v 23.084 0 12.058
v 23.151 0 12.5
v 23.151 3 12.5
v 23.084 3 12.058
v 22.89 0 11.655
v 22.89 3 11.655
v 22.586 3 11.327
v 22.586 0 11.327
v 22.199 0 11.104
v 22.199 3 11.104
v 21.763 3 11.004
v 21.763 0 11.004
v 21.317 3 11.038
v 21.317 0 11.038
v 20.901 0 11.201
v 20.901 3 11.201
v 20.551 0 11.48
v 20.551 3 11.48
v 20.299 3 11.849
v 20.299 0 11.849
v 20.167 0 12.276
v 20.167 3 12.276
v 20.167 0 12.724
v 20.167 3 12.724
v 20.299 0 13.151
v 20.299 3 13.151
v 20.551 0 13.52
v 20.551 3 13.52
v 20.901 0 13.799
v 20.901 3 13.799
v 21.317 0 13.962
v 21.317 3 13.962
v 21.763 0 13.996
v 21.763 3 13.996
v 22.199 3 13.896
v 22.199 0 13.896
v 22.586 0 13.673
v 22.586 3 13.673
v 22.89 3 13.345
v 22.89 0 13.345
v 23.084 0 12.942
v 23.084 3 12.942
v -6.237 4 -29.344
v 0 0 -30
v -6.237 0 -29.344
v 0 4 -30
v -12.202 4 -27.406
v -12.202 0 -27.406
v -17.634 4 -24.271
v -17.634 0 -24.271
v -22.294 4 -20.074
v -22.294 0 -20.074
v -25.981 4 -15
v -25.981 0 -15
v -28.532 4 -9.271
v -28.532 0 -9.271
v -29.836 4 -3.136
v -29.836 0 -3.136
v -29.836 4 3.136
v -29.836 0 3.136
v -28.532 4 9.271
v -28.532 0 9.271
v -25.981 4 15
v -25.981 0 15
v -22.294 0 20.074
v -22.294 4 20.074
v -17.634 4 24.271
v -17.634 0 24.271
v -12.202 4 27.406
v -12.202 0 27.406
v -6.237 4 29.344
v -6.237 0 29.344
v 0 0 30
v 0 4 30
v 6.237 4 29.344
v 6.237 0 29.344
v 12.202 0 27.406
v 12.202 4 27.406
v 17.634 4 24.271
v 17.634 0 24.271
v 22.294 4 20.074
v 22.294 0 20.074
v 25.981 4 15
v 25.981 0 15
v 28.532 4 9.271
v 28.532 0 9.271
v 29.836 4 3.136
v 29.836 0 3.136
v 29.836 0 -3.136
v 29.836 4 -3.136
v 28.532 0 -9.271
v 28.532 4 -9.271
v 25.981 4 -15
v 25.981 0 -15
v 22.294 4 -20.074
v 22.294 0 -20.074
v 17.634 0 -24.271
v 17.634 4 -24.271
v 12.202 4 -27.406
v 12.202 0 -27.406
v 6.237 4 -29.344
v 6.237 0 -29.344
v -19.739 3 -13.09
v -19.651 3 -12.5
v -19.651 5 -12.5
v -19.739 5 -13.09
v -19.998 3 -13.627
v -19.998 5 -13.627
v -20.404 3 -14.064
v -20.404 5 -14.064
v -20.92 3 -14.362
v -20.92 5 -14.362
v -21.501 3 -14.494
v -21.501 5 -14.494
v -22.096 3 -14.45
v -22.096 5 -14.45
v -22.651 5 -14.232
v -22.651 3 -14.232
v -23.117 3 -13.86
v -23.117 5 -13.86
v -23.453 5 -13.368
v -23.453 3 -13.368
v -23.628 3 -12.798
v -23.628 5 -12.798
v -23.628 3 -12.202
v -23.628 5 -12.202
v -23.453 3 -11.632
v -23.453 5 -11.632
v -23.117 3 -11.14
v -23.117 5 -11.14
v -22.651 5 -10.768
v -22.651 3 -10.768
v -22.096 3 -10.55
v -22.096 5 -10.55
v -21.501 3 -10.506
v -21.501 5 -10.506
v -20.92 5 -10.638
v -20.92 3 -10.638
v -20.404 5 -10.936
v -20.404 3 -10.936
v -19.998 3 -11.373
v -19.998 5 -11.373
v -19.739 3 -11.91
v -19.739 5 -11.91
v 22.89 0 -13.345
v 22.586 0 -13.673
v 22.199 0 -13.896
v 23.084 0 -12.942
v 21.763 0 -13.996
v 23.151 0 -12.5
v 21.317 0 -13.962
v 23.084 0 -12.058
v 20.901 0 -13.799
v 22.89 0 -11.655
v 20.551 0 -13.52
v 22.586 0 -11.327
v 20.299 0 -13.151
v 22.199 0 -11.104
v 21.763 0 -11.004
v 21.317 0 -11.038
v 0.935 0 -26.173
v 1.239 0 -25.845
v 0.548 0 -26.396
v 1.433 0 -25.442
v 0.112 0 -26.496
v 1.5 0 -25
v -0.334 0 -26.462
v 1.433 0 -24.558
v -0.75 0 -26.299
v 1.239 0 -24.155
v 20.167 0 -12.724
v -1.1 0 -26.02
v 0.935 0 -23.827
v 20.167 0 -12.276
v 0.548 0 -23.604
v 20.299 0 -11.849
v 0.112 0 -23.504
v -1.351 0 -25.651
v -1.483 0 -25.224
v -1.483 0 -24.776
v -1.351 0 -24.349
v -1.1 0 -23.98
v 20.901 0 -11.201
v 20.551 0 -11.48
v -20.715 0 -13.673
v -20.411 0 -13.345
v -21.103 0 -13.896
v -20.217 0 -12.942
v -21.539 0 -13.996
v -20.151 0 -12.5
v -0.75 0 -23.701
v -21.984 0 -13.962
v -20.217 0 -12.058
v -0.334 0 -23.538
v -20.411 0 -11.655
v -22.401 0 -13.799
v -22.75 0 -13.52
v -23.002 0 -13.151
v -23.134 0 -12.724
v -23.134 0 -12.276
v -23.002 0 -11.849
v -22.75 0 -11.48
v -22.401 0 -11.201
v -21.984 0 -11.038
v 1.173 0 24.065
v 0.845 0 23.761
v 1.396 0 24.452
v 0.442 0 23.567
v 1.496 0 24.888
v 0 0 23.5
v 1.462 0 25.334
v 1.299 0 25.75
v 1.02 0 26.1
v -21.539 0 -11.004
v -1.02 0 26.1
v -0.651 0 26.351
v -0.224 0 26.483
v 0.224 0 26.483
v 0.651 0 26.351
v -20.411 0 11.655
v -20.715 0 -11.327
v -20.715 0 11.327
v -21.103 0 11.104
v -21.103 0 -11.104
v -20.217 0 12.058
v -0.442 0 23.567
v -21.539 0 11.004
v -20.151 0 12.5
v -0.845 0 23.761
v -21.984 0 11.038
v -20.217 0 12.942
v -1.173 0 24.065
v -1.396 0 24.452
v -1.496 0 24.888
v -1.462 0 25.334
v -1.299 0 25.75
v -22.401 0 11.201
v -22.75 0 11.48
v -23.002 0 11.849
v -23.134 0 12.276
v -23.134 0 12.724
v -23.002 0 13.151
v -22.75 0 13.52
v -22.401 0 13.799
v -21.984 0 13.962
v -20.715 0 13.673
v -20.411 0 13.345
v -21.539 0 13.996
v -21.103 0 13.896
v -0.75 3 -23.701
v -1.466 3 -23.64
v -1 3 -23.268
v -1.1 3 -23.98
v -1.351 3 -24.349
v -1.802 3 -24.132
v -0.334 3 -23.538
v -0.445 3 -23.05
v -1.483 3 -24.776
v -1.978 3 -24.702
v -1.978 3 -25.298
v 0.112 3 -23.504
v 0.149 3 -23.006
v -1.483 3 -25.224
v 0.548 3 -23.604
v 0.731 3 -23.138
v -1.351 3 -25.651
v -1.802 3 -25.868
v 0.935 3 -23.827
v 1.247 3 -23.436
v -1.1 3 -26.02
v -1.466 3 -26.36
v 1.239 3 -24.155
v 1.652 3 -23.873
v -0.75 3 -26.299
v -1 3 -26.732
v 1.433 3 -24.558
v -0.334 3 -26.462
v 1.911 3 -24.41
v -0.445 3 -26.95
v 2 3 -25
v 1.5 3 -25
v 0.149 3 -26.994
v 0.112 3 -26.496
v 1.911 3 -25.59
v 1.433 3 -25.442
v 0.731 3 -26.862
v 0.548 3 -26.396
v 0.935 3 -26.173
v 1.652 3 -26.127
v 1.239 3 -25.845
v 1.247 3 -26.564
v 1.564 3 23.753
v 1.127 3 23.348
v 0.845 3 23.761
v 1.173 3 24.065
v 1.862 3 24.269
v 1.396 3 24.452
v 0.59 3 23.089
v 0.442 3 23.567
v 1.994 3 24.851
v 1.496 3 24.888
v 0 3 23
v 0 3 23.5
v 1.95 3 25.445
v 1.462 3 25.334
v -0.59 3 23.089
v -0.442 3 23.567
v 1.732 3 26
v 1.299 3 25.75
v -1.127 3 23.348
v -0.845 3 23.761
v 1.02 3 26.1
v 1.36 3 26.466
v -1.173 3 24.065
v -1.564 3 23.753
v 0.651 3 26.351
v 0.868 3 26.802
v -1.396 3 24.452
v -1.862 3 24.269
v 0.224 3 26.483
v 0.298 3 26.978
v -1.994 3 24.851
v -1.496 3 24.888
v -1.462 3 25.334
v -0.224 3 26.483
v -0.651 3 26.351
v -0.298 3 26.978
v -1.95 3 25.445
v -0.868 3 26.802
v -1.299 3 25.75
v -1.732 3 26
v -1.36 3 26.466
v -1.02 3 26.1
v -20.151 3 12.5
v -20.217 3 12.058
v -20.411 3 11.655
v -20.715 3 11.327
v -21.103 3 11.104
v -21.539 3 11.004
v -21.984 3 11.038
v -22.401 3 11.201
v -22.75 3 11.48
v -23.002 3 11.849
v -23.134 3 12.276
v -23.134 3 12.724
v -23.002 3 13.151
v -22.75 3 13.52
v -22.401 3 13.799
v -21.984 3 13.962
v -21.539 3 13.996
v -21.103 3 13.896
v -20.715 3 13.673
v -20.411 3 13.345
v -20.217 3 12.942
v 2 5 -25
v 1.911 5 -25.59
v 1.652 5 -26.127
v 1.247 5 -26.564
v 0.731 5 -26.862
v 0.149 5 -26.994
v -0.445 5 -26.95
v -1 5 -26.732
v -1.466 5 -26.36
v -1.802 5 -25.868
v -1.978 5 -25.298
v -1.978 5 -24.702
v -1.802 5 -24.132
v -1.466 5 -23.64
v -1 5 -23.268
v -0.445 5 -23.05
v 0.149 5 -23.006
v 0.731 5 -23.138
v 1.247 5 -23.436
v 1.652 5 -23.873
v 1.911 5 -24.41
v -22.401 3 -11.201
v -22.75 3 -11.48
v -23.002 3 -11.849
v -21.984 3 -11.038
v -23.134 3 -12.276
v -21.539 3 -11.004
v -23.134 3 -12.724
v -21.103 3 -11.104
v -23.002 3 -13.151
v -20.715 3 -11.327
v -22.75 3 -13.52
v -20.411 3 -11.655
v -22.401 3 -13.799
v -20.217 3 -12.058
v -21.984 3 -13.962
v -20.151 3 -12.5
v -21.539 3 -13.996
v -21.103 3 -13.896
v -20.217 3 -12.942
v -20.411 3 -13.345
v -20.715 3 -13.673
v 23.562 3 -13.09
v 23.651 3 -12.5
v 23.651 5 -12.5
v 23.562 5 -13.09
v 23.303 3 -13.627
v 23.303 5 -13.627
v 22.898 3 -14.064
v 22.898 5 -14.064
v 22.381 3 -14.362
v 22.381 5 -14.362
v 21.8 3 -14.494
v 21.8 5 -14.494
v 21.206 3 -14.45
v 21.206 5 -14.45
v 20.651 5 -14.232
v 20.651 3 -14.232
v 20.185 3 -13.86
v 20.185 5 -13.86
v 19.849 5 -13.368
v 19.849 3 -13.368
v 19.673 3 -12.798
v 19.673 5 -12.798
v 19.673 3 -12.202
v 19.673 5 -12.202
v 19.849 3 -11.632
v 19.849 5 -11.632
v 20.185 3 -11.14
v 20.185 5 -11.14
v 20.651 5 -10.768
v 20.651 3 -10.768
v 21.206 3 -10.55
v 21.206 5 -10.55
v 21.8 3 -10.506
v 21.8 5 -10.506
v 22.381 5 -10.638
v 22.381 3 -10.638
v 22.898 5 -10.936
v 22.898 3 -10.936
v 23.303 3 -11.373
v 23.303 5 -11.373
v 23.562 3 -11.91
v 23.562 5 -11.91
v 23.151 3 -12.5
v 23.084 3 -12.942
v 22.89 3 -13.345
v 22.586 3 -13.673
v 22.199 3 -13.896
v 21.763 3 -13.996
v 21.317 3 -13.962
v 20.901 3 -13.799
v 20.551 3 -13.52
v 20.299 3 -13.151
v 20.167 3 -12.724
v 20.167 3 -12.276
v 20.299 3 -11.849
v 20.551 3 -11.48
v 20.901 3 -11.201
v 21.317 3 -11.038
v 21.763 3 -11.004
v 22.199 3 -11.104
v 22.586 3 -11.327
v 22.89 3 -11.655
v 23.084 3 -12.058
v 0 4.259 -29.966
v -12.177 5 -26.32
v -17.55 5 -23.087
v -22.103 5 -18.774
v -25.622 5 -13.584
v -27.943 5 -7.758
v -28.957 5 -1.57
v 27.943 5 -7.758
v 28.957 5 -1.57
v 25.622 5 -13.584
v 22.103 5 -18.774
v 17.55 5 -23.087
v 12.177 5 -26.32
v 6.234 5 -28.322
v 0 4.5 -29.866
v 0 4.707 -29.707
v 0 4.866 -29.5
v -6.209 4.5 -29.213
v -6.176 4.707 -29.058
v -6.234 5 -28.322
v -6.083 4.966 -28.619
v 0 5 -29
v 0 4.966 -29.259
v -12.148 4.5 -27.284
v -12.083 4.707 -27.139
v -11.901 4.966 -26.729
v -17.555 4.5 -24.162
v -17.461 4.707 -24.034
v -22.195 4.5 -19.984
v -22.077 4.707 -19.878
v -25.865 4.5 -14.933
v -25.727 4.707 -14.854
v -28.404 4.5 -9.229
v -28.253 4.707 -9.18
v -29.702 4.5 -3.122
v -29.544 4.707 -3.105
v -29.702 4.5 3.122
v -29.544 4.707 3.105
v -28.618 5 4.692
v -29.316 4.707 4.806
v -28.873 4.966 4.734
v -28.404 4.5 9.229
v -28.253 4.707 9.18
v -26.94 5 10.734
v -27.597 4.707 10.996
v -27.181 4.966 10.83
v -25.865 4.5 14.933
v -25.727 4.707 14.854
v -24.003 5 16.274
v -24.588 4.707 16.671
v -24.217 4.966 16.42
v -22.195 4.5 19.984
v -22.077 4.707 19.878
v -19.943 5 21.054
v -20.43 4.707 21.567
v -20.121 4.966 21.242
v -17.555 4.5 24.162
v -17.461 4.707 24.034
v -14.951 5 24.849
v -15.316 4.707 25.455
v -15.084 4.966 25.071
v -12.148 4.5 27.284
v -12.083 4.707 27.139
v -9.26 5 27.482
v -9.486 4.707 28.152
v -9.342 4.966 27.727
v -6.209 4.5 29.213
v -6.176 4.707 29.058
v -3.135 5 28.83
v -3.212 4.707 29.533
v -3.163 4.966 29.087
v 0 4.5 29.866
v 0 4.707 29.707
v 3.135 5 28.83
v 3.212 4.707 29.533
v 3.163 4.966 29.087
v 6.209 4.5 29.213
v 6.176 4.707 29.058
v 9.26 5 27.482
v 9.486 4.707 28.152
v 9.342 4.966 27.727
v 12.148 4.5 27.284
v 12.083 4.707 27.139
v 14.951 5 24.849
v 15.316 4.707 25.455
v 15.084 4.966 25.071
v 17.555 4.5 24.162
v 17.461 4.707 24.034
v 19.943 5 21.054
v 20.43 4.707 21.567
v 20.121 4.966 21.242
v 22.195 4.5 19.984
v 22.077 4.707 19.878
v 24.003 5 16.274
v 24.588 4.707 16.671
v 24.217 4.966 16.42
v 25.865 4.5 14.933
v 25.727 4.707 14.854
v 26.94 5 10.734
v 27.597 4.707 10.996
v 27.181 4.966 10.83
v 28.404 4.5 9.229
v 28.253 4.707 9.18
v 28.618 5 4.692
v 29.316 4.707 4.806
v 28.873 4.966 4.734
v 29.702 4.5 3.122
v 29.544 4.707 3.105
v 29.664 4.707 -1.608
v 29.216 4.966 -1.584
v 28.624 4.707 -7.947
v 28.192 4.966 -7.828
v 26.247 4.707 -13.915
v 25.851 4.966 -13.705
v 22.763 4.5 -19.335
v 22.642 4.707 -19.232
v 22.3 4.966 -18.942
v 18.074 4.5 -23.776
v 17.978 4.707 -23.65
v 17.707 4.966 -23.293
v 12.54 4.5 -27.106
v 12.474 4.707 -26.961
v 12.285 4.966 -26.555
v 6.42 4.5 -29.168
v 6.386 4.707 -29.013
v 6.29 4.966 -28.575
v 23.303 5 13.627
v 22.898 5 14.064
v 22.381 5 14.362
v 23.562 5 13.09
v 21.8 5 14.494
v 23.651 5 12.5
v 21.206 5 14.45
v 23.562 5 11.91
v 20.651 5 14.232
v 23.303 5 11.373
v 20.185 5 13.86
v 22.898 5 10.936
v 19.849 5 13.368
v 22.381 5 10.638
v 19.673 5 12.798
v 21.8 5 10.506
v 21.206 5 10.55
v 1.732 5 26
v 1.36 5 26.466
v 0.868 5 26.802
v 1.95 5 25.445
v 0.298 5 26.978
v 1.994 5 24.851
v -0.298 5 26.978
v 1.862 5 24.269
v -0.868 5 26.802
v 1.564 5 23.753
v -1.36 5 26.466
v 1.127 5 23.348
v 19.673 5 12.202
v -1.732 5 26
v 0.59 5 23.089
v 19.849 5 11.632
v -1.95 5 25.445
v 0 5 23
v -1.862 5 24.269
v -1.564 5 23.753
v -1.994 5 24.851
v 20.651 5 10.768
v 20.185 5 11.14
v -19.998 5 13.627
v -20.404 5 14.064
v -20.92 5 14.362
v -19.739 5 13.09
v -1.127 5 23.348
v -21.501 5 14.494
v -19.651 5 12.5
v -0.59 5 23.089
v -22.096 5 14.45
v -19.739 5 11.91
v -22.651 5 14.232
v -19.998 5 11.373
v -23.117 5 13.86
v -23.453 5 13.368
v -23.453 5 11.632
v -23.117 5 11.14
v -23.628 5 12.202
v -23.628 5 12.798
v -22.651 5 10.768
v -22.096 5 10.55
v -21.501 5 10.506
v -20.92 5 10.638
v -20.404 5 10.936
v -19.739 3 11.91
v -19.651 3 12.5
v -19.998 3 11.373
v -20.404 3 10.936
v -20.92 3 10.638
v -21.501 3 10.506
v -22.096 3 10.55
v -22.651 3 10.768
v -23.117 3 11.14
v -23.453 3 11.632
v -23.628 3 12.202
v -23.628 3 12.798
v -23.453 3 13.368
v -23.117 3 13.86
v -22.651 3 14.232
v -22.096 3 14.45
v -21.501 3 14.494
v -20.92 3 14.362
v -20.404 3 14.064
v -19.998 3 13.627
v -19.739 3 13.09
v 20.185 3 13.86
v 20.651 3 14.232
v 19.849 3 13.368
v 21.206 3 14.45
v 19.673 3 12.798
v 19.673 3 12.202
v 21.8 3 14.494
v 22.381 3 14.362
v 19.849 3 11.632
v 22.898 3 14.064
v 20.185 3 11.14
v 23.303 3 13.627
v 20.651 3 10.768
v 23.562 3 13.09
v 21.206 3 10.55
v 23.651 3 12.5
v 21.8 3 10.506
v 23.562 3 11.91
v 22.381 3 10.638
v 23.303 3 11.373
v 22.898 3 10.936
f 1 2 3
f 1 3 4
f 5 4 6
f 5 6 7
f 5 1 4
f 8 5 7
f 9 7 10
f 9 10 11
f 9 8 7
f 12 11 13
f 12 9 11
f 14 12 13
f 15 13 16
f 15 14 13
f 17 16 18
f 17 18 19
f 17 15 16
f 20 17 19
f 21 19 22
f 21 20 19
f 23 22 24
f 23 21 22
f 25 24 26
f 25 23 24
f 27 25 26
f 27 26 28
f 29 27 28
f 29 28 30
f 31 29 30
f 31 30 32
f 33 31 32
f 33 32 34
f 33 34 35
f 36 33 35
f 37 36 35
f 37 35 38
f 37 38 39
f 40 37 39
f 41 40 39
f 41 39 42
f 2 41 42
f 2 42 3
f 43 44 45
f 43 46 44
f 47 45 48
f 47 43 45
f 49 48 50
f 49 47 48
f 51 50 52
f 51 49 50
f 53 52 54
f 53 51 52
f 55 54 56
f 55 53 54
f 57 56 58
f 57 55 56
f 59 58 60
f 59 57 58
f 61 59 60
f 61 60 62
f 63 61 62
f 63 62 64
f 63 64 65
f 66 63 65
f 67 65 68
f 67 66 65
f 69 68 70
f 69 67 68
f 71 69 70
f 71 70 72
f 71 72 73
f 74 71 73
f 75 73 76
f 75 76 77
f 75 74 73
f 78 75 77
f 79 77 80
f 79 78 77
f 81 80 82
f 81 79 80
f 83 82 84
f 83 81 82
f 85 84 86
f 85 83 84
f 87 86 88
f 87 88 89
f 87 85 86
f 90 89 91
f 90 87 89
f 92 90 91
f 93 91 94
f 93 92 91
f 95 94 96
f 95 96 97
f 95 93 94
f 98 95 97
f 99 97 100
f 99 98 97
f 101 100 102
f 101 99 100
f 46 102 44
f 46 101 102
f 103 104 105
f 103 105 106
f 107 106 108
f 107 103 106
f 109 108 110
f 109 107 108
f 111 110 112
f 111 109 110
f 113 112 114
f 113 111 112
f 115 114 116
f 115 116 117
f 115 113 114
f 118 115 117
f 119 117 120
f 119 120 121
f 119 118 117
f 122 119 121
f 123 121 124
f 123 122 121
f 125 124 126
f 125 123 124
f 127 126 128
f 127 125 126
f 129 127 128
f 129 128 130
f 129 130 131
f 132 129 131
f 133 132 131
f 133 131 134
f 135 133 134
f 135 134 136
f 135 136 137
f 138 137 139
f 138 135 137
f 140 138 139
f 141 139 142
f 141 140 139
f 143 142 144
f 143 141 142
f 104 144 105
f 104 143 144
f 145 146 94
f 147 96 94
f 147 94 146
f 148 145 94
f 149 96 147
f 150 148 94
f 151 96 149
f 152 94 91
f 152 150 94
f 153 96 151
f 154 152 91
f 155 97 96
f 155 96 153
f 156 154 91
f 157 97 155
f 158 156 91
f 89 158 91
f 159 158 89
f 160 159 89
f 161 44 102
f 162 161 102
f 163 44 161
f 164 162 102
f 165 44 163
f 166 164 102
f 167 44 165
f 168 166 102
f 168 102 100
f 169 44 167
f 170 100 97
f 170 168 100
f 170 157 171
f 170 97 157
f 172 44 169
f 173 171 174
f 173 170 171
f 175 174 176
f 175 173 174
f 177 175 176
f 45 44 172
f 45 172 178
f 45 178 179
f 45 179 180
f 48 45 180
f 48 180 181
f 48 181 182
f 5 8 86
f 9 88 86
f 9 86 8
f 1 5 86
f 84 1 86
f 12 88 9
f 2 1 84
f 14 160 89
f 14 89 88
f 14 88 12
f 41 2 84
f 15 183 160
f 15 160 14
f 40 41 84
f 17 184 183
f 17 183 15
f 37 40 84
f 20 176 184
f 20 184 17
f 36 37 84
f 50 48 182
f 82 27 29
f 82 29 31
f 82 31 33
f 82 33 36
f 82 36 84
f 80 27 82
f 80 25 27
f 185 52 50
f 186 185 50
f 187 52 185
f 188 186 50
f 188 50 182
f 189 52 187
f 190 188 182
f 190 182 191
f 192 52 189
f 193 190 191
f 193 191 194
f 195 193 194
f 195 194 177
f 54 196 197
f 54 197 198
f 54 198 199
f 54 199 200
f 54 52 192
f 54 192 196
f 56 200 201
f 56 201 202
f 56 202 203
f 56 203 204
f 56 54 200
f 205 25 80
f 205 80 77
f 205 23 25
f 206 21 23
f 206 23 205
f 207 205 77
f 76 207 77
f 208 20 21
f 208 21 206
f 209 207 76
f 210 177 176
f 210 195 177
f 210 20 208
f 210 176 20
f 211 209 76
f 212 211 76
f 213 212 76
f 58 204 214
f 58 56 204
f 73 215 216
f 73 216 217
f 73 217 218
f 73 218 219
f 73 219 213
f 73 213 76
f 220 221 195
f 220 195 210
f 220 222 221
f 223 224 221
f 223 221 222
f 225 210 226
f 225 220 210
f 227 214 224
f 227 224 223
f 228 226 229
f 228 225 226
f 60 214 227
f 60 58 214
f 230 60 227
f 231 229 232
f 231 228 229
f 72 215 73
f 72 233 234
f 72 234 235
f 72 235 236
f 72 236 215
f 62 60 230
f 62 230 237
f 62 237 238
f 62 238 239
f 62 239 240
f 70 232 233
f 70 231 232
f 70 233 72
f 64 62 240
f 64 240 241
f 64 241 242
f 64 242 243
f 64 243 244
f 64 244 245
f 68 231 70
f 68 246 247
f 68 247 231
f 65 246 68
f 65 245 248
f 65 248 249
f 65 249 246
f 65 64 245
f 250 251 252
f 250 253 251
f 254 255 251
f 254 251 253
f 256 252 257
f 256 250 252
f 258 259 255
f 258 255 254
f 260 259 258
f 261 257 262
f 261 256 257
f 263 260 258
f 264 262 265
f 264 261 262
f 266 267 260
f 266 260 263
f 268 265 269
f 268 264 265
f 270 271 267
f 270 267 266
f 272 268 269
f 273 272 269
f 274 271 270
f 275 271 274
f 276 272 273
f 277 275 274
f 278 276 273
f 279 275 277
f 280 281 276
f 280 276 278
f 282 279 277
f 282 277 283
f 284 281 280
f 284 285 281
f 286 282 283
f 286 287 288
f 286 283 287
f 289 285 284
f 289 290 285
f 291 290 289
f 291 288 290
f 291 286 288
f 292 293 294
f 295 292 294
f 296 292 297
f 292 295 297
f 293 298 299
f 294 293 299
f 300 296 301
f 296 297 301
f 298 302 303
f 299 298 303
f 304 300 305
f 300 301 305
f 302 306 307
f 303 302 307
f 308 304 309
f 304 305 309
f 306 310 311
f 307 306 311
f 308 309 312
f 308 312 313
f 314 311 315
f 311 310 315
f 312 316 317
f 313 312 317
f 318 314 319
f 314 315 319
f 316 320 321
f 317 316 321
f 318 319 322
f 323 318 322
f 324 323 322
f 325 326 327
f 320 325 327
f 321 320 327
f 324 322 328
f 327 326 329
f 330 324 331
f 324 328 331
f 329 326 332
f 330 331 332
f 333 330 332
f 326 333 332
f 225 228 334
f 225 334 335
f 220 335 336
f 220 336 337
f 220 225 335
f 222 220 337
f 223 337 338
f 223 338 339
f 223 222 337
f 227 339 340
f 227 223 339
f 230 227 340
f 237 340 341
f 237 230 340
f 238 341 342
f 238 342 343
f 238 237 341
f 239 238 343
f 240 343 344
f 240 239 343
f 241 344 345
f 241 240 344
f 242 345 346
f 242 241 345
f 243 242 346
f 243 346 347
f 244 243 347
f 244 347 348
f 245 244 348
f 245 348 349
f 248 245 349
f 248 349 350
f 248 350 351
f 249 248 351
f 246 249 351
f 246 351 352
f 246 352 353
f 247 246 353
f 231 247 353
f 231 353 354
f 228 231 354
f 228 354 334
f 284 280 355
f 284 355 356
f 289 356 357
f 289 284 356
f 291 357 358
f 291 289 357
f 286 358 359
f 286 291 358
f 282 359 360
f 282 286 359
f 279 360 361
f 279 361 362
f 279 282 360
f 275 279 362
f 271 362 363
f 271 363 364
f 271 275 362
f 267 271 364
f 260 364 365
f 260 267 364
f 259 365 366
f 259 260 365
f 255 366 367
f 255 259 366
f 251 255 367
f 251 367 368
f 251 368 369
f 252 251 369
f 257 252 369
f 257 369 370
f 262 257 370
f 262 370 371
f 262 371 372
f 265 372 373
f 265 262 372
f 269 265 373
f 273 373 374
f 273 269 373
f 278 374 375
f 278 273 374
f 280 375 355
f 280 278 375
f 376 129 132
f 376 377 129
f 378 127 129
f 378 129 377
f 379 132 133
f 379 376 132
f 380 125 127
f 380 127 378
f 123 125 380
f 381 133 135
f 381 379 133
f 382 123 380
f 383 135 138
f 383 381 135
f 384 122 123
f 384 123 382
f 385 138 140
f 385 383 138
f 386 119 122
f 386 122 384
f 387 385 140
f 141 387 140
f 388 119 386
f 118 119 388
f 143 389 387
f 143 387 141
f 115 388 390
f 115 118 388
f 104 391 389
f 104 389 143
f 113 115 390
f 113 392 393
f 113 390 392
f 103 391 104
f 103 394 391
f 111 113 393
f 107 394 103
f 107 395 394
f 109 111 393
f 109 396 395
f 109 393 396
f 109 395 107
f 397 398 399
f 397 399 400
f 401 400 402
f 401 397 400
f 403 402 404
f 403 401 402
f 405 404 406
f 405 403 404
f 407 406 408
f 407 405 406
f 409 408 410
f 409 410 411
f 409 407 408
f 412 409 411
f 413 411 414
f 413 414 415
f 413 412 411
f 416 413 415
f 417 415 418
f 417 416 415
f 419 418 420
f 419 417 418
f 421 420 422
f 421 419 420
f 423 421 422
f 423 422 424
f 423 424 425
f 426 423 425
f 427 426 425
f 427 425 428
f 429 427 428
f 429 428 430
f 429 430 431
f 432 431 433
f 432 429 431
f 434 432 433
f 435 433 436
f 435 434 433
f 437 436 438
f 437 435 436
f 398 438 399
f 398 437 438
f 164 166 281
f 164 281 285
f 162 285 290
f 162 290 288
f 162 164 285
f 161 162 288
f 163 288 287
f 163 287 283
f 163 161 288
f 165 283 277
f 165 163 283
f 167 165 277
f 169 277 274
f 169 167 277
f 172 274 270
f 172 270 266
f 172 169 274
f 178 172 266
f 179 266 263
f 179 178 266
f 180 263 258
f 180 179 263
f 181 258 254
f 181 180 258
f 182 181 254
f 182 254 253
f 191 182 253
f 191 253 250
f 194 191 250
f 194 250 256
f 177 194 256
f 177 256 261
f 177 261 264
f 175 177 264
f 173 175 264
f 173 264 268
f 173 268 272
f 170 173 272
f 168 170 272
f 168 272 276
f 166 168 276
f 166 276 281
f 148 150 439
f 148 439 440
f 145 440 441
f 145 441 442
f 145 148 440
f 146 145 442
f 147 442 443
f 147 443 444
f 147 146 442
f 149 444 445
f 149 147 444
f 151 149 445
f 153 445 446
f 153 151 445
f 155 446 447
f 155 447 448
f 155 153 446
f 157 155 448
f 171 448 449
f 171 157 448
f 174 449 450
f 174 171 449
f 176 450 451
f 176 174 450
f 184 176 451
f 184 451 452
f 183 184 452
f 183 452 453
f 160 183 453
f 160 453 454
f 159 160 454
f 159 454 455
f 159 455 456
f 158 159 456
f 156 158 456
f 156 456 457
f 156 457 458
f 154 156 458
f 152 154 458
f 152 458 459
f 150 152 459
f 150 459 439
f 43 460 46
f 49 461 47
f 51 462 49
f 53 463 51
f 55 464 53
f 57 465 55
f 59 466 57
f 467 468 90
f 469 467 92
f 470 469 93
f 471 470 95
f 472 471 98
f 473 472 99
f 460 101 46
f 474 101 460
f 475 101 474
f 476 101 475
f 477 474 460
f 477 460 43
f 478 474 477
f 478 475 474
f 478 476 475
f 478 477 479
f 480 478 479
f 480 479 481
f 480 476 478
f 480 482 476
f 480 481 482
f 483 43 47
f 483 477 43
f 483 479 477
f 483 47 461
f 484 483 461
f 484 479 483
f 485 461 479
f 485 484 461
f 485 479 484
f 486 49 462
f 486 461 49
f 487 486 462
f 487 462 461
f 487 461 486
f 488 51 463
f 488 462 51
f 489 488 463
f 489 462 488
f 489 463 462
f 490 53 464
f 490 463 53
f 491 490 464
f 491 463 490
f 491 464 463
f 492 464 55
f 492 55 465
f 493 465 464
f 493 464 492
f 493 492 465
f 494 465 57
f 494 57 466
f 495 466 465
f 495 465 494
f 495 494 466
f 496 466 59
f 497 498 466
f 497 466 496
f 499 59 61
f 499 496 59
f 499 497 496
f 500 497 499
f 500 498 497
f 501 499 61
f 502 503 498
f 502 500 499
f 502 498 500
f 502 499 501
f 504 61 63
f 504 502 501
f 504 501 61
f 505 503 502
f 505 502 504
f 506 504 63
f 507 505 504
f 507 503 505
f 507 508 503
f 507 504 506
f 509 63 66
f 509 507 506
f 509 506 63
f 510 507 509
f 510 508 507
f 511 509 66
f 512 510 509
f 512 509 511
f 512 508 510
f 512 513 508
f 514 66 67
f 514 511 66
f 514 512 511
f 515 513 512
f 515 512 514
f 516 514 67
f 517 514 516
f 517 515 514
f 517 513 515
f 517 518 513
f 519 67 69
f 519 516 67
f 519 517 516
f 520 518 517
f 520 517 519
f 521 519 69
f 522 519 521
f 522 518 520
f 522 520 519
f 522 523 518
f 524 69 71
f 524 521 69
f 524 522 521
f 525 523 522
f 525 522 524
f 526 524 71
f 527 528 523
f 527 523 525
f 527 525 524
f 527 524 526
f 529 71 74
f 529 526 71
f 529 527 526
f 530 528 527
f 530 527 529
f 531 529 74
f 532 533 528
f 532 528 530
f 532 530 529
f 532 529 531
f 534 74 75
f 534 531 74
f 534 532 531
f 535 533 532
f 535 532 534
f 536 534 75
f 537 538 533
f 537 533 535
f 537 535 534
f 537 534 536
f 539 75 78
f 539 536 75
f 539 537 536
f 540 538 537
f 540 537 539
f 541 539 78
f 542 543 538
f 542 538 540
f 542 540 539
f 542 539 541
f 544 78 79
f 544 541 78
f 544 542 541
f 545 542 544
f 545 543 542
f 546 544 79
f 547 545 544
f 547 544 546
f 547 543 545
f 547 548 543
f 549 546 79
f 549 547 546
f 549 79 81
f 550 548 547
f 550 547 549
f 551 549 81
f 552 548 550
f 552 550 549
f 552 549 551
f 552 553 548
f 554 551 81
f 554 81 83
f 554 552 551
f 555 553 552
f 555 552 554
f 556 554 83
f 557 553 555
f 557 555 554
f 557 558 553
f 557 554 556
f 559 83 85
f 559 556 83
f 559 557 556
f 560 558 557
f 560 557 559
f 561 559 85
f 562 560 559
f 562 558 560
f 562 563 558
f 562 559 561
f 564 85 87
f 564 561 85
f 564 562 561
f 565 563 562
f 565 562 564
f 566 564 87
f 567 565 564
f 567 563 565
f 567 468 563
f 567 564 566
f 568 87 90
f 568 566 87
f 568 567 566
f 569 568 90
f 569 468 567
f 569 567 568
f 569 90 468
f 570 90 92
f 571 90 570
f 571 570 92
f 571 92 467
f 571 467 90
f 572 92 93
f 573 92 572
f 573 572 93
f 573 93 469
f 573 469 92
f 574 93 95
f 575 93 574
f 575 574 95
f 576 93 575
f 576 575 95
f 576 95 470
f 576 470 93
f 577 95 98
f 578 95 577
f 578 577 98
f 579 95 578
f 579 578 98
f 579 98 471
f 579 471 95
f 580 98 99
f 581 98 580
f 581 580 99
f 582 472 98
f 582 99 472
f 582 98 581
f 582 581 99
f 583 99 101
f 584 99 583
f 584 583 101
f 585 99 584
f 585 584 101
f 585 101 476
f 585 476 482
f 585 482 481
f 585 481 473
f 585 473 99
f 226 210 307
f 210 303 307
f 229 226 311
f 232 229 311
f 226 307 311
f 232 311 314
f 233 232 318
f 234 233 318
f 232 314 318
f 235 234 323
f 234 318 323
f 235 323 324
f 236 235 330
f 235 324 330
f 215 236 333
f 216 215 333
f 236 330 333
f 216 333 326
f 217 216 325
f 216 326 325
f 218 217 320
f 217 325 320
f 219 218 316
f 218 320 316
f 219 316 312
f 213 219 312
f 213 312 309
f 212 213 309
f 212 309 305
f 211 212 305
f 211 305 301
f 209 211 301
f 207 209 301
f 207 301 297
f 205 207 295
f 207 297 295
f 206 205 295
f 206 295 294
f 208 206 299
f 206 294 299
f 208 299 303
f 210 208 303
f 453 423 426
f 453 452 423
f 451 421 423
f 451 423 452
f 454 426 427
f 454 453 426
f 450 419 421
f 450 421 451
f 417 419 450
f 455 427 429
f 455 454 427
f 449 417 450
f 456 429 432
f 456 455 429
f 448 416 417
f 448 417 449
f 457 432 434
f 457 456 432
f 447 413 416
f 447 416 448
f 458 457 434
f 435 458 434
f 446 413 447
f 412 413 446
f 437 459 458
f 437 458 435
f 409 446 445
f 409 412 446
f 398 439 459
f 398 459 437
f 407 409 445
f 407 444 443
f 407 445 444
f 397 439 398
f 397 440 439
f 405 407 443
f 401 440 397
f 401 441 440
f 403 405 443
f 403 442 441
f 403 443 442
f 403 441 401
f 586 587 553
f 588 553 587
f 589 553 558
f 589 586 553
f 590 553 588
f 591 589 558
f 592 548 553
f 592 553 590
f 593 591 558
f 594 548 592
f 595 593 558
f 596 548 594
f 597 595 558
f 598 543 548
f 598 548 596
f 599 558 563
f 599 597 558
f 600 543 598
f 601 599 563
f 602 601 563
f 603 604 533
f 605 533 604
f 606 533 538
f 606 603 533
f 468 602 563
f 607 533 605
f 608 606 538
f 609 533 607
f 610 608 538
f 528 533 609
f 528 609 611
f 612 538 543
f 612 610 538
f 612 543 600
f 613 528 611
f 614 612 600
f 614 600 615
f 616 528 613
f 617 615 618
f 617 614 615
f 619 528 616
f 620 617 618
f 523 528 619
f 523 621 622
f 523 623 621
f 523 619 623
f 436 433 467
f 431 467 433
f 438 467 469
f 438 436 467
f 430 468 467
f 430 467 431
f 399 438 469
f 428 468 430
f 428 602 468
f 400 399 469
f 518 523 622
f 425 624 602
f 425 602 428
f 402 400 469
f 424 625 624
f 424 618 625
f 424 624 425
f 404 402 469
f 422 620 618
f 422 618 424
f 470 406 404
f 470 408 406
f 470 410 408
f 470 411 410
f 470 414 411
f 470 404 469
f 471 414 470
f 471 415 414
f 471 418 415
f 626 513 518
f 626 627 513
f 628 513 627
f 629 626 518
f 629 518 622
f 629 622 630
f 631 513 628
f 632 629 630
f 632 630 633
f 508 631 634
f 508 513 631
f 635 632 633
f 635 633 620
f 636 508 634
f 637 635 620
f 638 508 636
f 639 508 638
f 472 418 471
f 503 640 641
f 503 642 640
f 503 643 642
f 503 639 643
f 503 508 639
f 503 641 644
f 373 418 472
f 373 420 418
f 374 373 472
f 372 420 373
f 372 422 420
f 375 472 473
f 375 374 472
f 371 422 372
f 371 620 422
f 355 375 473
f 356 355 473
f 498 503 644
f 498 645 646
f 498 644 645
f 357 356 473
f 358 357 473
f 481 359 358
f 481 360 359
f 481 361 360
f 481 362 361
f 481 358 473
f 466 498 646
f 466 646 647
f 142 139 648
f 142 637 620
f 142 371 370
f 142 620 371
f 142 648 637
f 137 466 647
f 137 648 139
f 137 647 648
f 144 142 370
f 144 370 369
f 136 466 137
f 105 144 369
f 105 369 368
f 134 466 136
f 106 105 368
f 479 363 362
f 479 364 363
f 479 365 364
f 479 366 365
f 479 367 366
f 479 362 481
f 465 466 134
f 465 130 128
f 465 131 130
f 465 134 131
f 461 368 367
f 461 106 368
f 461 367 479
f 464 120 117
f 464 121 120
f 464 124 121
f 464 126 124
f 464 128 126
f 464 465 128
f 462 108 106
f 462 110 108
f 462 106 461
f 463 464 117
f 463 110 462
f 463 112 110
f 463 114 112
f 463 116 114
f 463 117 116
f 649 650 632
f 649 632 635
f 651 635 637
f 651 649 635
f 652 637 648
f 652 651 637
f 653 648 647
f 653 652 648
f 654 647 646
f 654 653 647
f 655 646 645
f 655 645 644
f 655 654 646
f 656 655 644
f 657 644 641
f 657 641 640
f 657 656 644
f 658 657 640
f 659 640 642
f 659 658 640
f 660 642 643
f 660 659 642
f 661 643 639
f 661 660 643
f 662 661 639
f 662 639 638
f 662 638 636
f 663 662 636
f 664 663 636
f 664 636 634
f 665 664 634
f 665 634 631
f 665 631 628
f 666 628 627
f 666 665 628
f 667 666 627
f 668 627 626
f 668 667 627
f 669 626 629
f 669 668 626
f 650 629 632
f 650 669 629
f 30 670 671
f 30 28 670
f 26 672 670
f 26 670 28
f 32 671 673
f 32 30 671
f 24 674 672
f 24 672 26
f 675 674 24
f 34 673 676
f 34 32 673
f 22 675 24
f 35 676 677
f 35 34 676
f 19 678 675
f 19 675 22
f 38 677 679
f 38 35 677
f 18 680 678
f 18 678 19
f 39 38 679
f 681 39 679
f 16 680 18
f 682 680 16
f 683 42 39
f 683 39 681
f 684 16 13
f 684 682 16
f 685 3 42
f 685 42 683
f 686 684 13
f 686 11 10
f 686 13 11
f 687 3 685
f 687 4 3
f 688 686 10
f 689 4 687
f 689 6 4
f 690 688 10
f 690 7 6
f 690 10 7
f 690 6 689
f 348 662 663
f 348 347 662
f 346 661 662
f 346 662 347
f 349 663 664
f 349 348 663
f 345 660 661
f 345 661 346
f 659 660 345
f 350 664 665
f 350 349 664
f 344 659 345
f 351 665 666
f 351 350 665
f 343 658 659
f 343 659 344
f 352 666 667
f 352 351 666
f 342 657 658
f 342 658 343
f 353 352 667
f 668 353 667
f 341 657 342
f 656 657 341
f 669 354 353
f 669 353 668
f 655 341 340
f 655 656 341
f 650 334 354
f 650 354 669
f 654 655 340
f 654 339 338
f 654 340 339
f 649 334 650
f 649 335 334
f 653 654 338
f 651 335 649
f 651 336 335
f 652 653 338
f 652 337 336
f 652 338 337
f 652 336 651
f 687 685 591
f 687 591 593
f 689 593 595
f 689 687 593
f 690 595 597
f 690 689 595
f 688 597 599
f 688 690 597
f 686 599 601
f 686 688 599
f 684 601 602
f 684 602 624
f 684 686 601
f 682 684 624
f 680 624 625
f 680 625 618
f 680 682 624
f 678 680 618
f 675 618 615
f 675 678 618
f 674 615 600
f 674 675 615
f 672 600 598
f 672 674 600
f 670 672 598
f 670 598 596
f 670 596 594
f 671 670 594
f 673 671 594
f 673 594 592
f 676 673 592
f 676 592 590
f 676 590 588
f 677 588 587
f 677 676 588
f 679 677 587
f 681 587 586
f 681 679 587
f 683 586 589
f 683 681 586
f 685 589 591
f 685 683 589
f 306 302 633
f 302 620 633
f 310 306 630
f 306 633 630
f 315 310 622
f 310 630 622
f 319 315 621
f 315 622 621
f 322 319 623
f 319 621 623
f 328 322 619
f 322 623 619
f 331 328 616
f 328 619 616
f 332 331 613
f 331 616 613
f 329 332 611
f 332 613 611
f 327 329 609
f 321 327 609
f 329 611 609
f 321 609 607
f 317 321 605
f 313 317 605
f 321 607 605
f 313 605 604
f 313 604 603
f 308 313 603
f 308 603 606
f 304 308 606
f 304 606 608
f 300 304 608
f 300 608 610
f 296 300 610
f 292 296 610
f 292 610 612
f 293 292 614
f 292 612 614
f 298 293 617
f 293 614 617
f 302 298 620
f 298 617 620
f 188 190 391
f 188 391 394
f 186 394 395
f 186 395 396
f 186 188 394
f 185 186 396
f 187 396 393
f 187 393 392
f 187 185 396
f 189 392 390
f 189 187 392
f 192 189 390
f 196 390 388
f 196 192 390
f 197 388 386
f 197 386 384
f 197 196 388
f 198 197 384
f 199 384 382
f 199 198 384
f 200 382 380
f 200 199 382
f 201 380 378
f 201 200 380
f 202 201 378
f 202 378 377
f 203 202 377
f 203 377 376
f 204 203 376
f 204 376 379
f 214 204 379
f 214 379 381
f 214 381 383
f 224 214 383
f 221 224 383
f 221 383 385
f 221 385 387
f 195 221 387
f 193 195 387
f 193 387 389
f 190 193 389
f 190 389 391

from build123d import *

# Parameters (mm, degrees)
PATTERN_CIRCULAR_1_OUTLINE_R     = 1.5
PATTERN_CIRCULAR_1_DEPTH         = 5
PATTERN_START                    = 3
PATTERN_CIRCULAR_1_2_OUTLINE_R   = 2
PATTERN_CIRCULAR_1_2_OUTLINE_R_2 = 1.5
PATTERN_CIRCULAR_1_2_DEPTH       = 2


# Read off the part's stored shape, not the designer's step: Круговой массив1
with BuildPart() as part:
    # Эскиз1 → Повернуть1 (revolve)
    with BuildSketch(Plane(origin=(0, 0, 0), x_dir=(0, 0, -1), z_dir=(1, 0, 0))):
        with BuildLine():
            Line((0, 0), (30, 0))
            Line((30, 0), (30, 4))
            ThreePointArc((30, 4), (29.707106781, 4.707106781), (29, 5))
            Line((29, 5), (0, 5))
            Line((0, 5), (0, 0))
        make_face()
    revolve(axis=Axis((0, 0, 0), (0, 1, 0)))

    # Эскиз2 → Вырез-Повернуть1 (revolve, cut)
    with BuildSketch(Plane(origin=(0, 0, 0), x_dir=(0, 0, -1), z_dir=(1, 0, 0))):
        Polygon((-25, 0), (-23.5, 0), (-23.5, 3), (-23, 3), (-23, 5), (-25, 5), align=None)
    revolve(axis=Axis((0, 0, 25), (0, 1, 0)), mode=Mode.SUBTRACT)

    # Круговой массив1 outline → Круговой массив1 (cut)
    with BuildSketch(Plane(origin=(0, 0, 0), x_dir=(1, 0, 0), z_dir=(0, 1, 0))):
        with Locations((-21.650635095, -12.5)):
            Circle(PATTERN_CIRCULAR_1_OUTLINE_R)
        with Locations((-21.650635095, 12.5)):
            Circle(PATTERN_CIRCULAR_1_OUTLINE_R)
        with Locations((0, 25)):
            Circle(PATTERN_CIRCULAR_1_OUTLINE_R)
        with Locations((21.650635095, 12.5)):
            Circle(PATTERN_CIRCULAR_1_OUTLINE_R)
        with Locations((21.650635095, -12.5)):
            Circle(PATTERN_CIRCULAR_1_OUTLINE_R)
    extrude(amount=PATTERN_CIRCULAR_1_DEPTH, mode=Mode.SUBTRACT)

    # Pattern Circular 1 2 outline → Pattern Circular 1 2 (cut)
    # profile 1 of 5: a face of its own
    with BuildSketch(Plane(origin=(0, 0, 0), x_dir=(1, 0, 0), z_dir=(0, 1, 0)).offset(PATTERN_START)):
        with Locations((-21.650635095, -12.5)):
            Circle(PATTERN_CIRCULAR_1_2_OUTLINE_R)
        with Locations((-21.650635095, -12.5)):
            Circle(PATTERN_CIRCULAR_1_2_OUTLINE_R_2, mode=Mode.SUBTRACT)
    # profile 2 of 5: a face of its own
    with BuildSketch(Plane(origin=(0, 0, 0), x_dir=(1, 0, 0), z_dir=(0, 1, 0)).offset(PATTERN_START)):
        with Locations((-21.650635095, 12.5)):
            Circle(PATTERN_CIRCULAR_1_2_OUTLINE_R)
        with Locations((-21.650635095, 12.5)):
            Circle(PATTERN_CIRCULAR_1_2_OUTLINE_R_2, mode=Mode.SUBTRACT)
    # profile 3 of 5: a face of its own
    with BuildSketch(Plane(origin=(0, 0, 0), x_dir=(1, 0, 0), z_dir=(0, 1, 0)).offset(PATTERN_START)):
        with Locations((0, 25)):
            Circle(PATTERN_CIRCULAR_1_2_OUTLINE_R)
        with Locations((0, 25)):
            Circle(PATTERN_CIRCULAR_1_2_OUTLINE_R_2, mode=Mode.SUBTRACT)
    # profile 4 of 5: a face of its own
    with BuildSketch(Plane(origin=(0, 0, 0), x_dir=(1, 0, 0), z_dir=(0, 1, 0)).offset(PATTERN_START)):
        with Locations((21.650635095, 12.5)):
            Circle(PATTERN_CIRCULAR_1_2_OUTLINE_R)
        with Locations((21.650635095, 12.5)):
            Circle(PATTERN_CIRCULAR_1_2_OUTLINE_R_2, mode=Mode.SUBTRACT)
    # profile 5 of 5: a face of its own
    with BuildSketch(Plane(origin=(0, 0, 0), x_dir=(1, 0, 0), z_dir=(0, 1, 0)).offset(PATTERN_START)):
        with Locations((21.650635095, -12.5)):
            Circle(PATTERN_CIRCULAR_1_2_OUTLINE_R)
        with Locations((21.650635095, -12.5)):
            Circle(PATTERN_CIRCULAR_1_2_OUTLINE_R_2, mode=Mode.SUBTRACT)
    extrude(amount=PATTERN_CIRCULAR_1_2_DEPTH, mode=Mode.SUBTRACT)


solid = part.part
